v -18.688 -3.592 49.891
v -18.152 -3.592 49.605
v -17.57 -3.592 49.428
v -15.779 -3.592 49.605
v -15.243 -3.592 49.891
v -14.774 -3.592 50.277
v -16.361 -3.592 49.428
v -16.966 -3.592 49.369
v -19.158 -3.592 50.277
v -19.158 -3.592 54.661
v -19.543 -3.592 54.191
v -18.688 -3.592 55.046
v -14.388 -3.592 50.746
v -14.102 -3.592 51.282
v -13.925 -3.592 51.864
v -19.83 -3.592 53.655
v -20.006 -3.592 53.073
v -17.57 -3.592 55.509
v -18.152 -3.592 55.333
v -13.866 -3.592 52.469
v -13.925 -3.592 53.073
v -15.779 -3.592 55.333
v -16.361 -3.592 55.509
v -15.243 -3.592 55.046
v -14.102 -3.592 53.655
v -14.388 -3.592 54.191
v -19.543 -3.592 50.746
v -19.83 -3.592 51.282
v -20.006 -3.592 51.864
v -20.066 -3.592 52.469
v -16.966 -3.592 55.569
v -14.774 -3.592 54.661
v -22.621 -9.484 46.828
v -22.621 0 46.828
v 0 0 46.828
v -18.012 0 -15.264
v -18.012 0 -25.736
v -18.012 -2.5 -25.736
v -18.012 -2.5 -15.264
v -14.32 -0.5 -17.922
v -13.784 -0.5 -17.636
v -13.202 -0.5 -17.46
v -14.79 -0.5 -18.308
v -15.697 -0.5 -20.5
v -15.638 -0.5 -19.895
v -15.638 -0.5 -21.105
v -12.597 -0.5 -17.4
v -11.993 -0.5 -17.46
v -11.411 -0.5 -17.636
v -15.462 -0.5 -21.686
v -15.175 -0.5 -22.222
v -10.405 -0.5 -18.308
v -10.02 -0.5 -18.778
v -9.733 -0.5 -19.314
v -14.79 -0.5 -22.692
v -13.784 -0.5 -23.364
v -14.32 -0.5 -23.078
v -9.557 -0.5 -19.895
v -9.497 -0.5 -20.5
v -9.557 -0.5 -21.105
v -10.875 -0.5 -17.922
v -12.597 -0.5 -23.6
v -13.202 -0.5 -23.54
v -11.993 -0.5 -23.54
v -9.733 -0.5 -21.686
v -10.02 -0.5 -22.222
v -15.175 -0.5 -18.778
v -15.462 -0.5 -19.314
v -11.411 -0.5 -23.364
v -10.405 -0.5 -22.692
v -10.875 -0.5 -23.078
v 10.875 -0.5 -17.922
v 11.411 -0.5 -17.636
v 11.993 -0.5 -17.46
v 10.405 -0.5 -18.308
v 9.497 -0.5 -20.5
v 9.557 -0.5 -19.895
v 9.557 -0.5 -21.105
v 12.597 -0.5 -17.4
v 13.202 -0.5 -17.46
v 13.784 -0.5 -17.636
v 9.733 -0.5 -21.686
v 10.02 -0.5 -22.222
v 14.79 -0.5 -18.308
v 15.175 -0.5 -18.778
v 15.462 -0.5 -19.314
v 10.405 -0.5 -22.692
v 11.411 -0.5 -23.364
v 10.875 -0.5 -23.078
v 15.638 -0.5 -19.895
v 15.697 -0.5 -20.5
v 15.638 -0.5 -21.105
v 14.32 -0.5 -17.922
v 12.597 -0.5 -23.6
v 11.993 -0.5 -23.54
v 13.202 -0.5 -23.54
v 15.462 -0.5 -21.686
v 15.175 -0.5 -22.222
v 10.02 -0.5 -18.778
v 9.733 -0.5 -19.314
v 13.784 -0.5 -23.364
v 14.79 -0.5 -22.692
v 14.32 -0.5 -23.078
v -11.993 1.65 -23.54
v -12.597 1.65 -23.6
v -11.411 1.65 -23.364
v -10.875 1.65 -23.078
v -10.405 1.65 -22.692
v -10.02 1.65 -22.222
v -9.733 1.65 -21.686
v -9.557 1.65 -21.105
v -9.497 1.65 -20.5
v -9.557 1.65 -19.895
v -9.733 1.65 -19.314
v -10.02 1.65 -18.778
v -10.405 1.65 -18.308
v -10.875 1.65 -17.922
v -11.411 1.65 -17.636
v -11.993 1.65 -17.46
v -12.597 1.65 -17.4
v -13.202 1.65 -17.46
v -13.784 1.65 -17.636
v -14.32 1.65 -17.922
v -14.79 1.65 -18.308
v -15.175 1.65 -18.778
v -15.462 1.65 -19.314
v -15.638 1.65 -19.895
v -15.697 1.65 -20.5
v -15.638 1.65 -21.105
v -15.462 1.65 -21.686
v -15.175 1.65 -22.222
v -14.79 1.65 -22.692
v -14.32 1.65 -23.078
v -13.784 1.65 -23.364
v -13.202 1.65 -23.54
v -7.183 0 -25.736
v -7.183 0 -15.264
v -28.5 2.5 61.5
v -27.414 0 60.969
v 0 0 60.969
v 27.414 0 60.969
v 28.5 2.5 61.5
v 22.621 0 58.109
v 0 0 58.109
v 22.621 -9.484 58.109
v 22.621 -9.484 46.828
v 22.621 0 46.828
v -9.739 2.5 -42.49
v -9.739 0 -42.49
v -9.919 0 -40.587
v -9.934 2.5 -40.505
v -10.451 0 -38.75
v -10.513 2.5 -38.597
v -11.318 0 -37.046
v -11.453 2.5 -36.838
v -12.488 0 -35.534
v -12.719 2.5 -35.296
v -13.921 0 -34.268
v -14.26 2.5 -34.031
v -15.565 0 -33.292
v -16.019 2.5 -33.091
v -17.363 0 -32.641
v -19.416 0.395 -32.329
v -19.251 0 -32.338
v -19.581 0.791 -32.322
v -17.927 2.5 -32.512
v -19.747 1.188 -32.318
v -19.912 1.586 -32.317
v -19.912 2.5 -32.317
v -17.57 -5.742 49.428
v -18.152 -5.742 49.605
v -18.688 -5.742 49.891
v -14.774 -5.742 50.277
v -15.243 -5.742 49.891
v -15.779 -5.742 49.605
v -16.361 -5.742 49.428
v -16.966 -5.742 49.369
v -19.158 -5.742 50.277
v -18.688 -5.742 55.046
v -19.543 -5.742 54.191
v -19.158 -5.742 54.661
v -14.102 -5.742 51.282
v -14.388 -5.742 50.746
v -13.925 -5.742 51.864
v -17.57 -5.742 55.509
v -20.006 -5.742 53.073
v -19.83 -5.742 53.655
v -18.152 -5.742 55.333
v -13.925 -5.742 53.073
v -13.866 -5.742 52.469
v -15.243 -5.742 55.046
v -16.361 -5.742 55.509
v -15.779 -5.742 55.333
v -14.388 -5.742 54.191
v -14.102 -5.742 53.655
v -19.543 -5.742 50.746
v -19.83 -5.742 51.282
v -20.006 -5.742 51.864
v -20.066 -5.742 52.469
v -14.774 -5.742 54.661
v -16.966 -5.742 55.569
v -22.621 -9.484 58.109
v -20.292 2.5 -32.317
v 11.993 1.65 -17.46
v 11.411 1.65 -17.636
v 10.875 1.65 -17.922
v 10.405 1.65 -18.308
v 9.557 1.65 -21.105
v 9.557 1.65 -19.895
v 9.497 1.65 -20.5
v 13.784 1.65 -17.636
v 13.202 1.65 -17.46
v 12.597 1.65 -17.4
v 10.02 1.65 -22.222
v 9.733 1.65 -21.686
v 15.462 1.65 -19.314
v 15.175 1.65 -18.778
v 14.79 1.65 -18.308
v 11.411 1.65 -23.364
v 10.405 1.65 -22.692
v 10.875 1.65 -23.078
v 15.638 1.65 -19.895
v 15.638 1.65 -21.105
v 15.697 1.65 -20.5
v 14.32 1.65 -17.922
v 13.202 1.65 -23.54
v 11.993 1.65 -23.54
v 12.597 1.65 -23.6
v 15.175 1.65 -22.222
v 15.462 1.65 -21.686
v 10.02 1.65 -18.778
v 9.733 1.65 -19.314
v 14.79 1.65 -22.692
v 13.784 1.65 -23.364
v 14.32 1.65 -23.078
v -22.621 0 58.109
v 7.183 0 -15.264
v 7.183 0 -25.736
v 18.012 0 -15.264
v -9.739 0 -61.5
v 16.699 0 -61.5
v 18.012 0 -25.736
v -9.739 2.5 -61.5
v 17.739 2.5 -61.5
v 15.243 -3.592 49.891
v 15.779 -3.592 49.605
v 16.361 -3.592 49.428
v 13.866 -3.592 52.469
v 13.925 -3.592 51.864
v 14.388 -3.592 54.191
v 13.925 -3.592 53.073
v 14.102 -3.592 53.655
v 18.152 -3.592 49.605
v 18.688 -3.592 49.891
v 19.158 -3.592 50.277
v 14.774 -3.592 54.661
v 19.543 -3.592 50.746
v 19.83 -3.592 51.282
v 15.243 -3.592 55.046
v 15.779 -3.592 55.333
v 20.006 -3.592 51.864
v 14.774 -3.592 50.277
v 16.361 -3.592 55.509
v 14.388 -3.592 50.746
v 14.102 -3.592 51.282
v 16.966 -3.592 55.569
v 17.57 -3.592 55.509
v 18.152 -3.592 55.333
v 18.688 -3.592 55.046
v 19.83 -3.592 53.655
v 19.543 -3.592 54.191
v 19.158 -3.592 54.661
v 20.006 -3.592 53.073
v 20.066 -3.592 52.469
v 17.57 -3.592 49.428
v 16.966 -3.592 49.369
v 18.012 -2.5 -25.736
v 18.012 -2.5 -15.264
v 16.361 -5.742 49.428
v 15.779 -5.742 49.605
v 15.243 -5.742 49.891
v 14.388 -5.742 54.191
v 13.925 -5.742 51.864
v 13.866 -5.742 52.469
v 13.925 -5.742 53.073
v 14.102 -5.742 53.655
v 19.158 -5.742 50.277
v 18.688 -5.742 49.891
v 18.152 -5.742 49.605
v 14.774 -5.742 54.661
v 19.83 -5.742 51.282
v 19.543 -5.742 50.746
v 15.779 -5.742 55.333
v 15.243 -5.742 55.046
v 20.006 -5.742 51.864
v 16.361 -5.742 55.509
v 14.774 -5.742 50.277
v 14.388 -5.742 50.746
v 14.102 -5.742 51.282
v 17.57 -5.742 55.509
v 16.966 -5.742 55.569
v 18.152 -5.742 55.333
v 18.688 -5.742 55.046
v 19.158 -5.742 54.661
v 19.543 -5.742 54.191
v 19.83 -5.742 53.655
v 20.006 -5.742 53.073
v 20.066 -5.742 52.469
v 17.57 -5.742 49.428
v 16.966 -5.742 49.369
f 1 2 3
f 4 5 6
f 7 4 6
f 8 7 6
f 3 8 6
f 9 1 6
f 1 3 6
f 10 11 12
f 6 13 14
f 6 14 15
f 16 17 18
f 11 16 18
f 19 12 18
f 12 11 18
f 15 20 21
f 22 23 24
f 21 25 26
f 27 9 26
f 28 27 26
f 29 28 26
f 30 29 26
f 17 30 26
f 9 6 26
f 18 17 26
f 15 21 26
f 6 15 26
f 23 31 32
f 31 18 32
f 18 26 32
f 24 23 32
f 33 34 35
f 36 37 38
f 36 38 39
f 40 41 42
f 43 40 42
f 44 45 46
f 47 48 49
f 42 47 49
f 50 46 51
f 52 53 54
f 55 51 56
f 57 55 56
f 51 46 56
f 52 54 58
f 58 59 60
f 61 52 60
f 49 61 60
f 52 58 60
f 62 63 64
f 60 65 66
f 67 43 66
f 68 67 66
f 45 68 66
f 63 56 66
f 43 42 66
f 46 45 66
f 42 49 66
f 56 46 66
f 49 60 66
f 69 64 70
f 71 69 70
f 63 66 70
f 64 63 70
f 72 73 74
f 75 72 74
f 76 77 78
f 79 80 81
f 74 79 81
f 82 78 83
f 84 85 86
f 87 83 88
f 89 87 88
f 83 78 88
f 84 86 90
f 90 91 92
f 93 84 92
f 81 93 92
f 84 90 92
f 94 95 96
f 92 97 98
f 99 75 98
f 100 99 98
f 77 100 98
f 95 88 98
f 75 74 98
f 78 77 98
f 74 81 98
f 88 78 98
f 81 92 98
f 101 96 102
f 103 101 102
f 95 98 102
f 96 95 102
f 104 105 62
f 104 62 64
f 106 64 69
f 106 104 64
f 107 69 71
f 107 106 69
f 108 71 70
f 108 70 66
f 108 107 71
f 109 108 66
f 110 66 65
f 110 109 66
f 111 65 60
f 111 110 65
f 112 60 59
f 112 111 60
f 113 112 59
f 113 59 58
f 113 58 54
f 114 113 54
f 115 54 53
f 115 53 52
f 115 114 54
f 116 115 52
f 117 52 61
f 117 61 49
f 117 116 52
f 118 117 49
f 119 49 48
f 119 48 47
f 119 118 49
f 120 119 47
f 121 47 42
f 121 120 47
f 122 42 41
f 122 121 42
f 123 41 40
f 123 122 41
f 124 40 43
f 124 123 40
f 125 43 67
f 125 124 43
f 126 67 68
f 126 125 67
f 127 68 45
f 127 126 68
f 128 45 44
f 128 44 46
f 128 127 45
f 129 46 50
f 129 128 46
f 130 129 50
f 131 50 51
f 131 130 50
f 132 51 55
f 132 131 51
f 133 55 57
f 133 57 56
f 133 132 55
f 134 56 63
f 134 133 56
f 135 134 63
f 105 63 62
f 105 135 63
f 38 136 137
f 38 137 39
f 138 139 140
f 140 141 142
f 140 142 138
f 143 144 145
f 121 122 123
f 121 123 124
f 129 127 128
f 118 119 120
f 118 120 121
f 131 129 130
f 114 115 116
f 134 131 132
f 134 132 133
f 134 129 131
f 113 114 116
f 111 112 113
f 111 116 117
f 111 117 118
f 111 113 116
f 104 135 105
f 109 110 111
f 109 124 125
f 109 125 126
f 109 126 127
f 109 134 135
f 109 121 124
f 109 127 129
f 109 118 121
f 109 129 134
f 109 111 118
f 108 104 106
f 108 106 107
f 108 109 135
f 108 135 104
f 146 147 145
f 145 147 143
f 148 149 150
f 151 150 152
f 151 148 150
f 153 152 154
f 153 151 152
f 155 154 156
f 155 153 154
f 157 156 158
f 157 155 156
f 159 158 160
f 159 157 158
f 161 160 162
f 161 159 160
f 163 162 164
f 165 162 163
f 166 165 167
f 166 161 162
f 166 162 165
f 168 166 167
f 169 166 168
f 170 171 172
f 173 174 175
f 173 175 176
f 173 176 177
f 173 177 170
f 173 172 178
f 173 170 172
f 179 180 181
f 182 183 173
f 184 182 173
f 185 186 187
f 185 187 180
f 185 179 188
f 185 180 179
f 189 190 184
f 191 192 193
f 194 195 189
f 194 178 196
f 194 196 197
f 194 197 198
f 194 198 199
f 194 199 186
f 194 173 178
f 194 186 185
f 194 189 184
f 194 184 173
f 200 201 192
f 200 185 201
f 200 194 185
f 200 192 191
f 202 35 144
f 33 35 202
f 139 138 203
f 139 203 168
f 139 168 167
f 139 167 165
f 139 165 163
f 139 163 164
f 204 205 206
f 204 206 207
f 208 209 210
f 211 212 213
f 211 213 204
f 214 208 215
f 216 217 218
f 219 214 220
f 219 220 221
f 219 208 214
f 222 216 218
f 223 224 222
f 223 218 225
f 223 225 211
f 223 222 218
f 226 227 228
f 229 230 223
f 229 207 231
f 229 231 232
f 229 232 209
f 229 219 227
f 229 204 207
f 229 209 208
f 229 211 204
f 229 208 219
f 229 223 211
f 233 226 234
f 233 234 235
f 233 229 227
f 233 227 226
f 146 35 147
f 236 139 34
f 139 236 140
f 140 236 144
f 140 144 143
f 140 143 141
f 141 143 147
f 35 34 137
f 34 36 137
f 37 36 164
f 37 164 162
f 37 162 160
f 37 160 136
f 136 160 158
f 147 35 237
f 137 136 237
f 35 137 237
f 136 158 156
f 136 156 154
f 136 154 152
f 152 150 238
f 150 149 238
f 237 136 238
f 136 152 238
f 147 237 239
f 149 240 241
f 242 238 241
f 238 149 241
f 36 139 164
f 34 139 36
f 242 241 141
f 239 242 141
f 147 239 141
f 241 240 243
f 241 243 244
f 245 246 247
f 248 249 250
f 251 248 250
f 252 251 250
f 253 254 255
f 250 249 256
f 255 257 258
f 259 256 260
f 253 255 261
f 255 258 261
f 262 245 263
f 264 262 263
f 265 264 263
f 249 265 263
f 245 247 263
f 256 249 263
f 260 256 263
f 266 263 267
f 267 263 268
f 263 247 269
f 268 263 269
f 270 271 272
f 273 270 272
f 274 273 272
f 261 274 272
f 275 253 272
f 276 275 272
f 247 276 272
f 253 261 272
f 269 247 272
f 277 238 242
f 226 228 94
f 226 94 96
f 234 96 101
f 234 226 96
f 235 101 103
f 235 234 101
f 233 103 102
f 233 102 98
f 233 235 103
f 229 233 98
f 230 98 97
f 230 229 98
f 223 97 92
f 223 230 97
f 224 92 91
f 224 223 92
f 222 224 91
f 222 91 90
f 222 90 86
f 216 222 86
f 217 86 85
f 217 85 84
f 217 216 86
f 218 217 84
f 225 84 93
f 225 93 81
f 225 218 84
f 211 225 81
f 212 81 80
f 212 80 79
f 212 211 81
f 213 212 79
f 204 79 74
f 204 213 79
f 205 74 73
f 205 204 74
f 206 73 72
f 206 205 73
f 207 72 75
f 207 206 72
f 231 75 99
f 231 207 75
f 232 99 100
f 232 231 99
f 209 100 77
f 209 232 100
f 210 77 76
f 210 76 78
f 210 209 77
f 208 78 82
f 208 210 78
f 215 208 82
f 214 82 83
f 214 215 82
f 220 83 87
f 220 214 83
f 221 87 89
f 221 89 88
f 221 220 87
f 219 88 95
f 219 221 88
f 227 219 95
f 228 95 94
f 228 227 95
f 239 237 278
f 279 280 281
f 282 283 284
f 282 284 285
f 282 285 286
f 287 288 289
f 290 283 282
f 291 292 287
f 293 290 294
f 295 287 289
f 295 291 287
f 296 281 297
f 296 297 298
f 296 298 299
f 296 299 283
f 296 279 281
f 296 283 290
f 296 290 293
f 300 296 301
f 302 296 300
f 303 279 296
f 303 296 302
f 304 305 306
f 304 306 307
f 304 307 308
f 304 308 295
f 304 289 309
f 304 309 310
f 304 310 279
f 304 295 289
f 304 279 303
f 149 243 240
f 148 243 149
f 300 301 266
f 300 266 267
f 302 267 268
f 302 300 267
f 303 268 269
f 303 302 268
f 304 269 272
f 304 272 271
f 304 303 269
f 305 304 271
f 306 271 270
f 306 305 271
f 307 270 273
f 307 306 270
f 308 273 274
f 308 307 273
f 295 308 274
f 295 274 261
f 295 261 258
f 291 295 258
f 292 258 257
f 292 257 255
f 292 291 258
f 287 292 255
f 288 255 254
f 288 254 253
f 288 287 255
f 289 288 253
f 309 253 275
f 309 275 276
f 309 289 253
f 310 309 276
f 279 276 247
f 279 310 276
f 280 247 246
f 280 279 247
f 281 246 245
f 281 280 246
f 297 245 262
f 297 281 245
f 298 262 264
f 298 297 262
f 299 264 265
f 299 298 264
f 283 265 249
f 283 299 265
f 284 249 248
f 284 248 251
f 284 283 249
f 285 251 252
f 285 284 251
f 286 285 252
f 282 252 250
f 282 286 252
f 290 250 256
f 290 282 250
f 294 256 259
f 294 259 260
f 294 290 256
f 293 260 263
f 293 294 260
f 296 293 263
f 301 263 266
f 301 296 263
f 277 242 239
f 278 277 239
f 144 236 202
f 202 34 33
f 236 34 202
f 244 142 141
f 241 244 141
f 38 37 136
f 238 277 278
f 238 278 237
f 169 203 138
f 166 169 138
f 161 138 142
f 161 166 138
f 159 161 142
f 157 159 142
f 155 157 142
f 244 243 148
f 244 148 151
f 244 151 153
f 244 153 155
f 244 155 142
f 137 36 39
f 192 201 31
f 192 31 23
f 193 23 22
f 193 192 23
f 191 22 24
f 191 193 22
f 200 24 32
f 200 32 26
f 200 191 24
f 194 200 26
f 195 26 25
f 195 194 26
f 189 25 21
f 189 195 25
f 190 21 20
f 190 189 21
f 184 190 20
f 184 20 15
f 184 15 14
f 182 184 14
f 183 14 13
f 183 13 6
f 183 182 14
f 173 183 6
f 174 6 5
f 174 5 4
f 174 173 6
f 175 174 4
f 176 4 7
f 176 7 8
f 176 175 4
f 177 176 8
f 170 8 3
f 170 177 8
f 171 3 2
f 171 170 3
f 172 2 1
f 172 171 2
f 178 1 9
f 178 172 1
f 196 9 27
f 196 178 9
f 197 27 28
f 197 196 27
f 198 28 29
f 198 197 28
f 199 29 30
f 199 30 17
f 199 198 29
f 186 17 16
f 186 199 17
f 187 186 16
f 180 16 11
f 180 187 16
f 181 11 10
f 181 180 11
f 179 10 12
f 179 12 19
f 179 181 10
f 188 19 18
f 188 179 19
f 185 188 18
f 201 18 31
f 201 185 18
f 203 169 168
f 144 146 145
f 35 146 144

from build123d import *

# Parameters (mm, degrees)
SKIZZE1_W                            = 57
SKIZZE1_H                            = 123
AUFSATZ_LINEAR_AUSTRAGEN1_DEPTH      = 2.5
SCHNITT_LINEAR_AUSTRAGEN1_DEPTH      = 84.889808678
SCHNITT_LINEAR_AUSTRAGEN2_DEPTH      = 68.828828679
SCHNITT_LINEAR_AUSTRAGEN3_DEPTH      = 70.726045338
SCHNITT_LINEAR_AUSTRAGEN3_DEPTH_BACK = 70.726045338
SCHNITT_LINEAR_AUSTRAGEN4_DEPTH      = 70.47454308
SCHNITT_LINEAR_AUSTRAGEN4_DEPTH_BACK = 70.47454308
SKIZZE9_W                            = 45.241474544
SKIZZE9_H                            = 11.280630507
AUFSATZ_LINEAR_AUSTRAGEN2_DEPTH      = 13
SCHNITT_LINEAR_AUSTRAGEN5_DEPTH      = 20
SKIZZE12_W                           = 36.023643564
SKIZZE12_H                           = 10.472363364
AUFSATZ_LINEAR_AUSTRAGEN3_DEPTH      = 5
SCHNITT_LINEAR_AUSTRAGEN6_DEPTH      = 12
SCHNITT_LINEAR_AUSTRAGEN8_DEPTH      = 0.5
SCHNITT_LINEAR_AUSTRAGEN8_DEPTH_BACK = 1.65
SKIZZE16_R                           = 3.1
SCHNITT_LINEAR_AUSTRAGEN9_DEPTH      = 1.15
SCHNITT_LINEAR_AUSTRAGEN9_DEPTH_BACK = 1
SKIZZE17_R                           = 3.1
SCHNITT_LINEAR_AUSTRAGEN10_DEPTH     = 10


with BuildPart() as part:
    # Skizze1 → Aufsatz-Linear austragen1 (new body)
    with BuildSketch(Plane(origin=(0, 0, 0), x_dir=(1, 0, 0), z_dir=(0, 1, 0))):
        Rectangle(SKIZZE1_W, SKIZZE1_H)
    extrude(amount=AUFSATZ_LINEAR_AUSTRAGEN1_DEPTH)

    # Skizze2 → Schnitt-Linear austragen1 (cut, through all)
    with BuildSketch(Plane(origin=(28.5, 0, 0), x_dir=(0, 0, -1), z_dir=(1, 0, 0))):
        Polygon((-61.5, 2.5), (-61.5, 0), (-60.968608596, 0), align=None)
    extrude(amount=-SCHNITT_LINEAR_AUSTRAGEN1_DEPTH, mode=Mode.SUBTRACT)

    # Skizze3 → Schnitt-Linear austragen2 (cut, through all)
    with BuildSketch(Plane(origin=(0, 2.5, 0), x_dir=(1, 0, 0), z_dir=(0, 1, 0))):
        Polygon((-28.5, -61.5), (-17.738894386, 61.5), (-28.5, 61.5), align=None)
        Polygon((28.5, -61.5), (17.738894386, 61.5), (28.5, 61.5), align=None)
    extrude(amount=-SCHNITT_LINEAR_AUSTRAGEN2_DEPTH, mode=Mode.SUBTRACT)

    # Skizze5 → Schnitt-Linear austragen3 (cut, two sides: drawn at the far end of the back side and taken through both)
    with BuildSketch(Plane(origin=(0.175618176, 0, 2.007324937), x_dir=(0, -1, 0), z_dir=(0.08715574274765484, 0, 0.9961946980917459)).offset(-SCHNITT_LINEAR_AUSTRAGEN3_DEPTH_BACK)):
        Polygon((0.008562414, 23.031470717), (-2.5, 23.031470717), (0, 21.995936811), align=None)
    extrude(amount=SCHNITT_LINEAR_AUSTRAGEN3_DEPTH + SCHNITT_LINEAR_AUSTRAGEN3_DEPTH_BACK, mode=Mode.SUBTRACT)

    # Skizze6 → Schnitt-Linear austragen4 (cut, two sides: drawn at the far end of the back side and taken through both)
    with BuildSketch(Plane(origin=(-0.152372814, 0, 1.741629235), x_dir=(0, 1, 0), z_dir=(-0.08715574274766175, 0, 0.9961946980917452)).offset(-SCHNITT_LINEAR_AUSTRAGEN4_DEPTH_BACK)):
        Polygon((2.5, 23.031470717), (0, 21.995936811), (0, 23.031470717), align=None)
    extrude(amount=SCHNITT_LINEAR_AUSTRAGEN4_DEPTH + SCHNITT_LINEAR_AUSTRAGEN4_DEPTH_BACK, mode=Mode.SUBTRACT)

    # Skizze9 → Aufsatz-Linear austragen2 (add)
    with BuildSketch(Plane.XZ):
        with Locations((0, 52.468608596)):
            Rectangle(SKIZZE9_W, SKIZZE9_H)
    extrude(amount=AUFSATZ_LINEAR_AUSTRAGEN2_DEPTH)

    # Skizze11 → Schnitt-Linear austragen5 (cut)
    with BuildSketch(Plane(origin=(0, 0, 46.828293342), x_dir=(-1, 0, 0), z_dir=(0, 0, -1))):
        Polygon((-22.620737272, -9.484039906), (0, 0), (22.620737272, -9.484039906), (22.620737272, -13), (-22.620737272, -13), align=None)
    extrude(amount=-SCHNITT_LINEAR_AUSTRAGEN5_DEPTH, mode=Mode.SUBTRACT)

    # Skizze12 → Aufsatz-Linear austragen3 (add)
    with BuildSketch(Plane.XZ):
        with Locations((0, -20.5)):
            Rectangle(SKIZZE12_W, SKIZZE12_H)
    extrude(amount=AUFSATZ_LINEAR_AUSTRAGEN3_DEPTH)

    # Skizze13 → Schnitt-Linear austragen6 (cut)
    with BuildSketch(Plane(origin=(0, 0, -25.736181682), x_dir=(-1, 0, 0), z_dir=(0, 0, -1))):
        Polygon((-18.011821782, -2.5), (-7.183132097, 0), (7.183132097, 0), (18.011821782, -2.5), (18.011821782, -5), (-18.011821782, -5), align=None)
    extrude(amount=-SCHNITT_LINEAR_AUSTRAGEN6_DEPTH, mode=Mode.SUBTRACT)

    # Skizze16 → Schnitt-Linear austragen8 (cut, two sides: drawn at the far end of the back side and taken through both)
    with BuildSketch(Plane.XZ.offset(-SCHNITT_LINEAR_AUSTRAGEN8_DEPTH_BACK)):
        with Locations((12.59747694, -20.5)):
            Circle(SKIZZE16_R)
        with Locations((-12.59747694, -20.5)):
            Circle(SKIZZE16_R)
    extrude(amount=SCHNITT_LINEAR_AUSTRAGEN8_DEPTH + SCHNITT_LINEAR_AUSTRAGEN8_DEPTH_BACK, mode=Mode.SUBTRACT)

    # Skizze17 → Schnitt-Linear austragen9 (cut, two sides: drawn at the far end of the back side and taken through both)
    with BuildSketch(Plane(origin=(0, -4.742019953, 0), x_dir=(1, 0, 0), z_dir=(0, 1, 0)).offset(-SCHNITT_LINEAR_AUSTRAGEN9_DEPTH_BACK)):
        with Locations((-16.965552954, -52.468608596)):
            Circle(SKIZZE17_R)
        with Locations((16.965552954, -52.468608596)):
            Circle(SKIZZE17_R)
    extrude(amount=SCHNITT_LINEAR_AUSTRAGEN9_DEPTH + SCHNITT_LINEAR_AUSTRAGEN9_DEPTH_BACK, mode=Mode.SUBTRACT)

    # Skizze18 → Schnitt-Linear austragen10 (cut)
    with BuildSketch(Plane(origin=(0, 2.5, 0), x_dir=(1, 0, 0), z_dir=(0, 1, 0))):
        with BuildLine():
            Line((-9.738894386, 61.5), (-9.738894386, 42.49))
            ThreePointArc((-9.738894386, 42.49), (-12.718555412, 35.29646194), (-19.912093472, 32.316800915))
            Line((-19.912093472, 32.316800915), (-20.292093472, 32.316800915))
            Line((-20.292093472, 32.316800915), (-17.738894386, 61.5))
            Line((-17.738894386, 61.5), (-9.738894386, 61.5))
        make_face()
    extrude(amount=-SCHNITT_LINEAR_AUSTRAGEN10_DEPTH, mode=Mode.SUBTRACT)


solid = part.part
